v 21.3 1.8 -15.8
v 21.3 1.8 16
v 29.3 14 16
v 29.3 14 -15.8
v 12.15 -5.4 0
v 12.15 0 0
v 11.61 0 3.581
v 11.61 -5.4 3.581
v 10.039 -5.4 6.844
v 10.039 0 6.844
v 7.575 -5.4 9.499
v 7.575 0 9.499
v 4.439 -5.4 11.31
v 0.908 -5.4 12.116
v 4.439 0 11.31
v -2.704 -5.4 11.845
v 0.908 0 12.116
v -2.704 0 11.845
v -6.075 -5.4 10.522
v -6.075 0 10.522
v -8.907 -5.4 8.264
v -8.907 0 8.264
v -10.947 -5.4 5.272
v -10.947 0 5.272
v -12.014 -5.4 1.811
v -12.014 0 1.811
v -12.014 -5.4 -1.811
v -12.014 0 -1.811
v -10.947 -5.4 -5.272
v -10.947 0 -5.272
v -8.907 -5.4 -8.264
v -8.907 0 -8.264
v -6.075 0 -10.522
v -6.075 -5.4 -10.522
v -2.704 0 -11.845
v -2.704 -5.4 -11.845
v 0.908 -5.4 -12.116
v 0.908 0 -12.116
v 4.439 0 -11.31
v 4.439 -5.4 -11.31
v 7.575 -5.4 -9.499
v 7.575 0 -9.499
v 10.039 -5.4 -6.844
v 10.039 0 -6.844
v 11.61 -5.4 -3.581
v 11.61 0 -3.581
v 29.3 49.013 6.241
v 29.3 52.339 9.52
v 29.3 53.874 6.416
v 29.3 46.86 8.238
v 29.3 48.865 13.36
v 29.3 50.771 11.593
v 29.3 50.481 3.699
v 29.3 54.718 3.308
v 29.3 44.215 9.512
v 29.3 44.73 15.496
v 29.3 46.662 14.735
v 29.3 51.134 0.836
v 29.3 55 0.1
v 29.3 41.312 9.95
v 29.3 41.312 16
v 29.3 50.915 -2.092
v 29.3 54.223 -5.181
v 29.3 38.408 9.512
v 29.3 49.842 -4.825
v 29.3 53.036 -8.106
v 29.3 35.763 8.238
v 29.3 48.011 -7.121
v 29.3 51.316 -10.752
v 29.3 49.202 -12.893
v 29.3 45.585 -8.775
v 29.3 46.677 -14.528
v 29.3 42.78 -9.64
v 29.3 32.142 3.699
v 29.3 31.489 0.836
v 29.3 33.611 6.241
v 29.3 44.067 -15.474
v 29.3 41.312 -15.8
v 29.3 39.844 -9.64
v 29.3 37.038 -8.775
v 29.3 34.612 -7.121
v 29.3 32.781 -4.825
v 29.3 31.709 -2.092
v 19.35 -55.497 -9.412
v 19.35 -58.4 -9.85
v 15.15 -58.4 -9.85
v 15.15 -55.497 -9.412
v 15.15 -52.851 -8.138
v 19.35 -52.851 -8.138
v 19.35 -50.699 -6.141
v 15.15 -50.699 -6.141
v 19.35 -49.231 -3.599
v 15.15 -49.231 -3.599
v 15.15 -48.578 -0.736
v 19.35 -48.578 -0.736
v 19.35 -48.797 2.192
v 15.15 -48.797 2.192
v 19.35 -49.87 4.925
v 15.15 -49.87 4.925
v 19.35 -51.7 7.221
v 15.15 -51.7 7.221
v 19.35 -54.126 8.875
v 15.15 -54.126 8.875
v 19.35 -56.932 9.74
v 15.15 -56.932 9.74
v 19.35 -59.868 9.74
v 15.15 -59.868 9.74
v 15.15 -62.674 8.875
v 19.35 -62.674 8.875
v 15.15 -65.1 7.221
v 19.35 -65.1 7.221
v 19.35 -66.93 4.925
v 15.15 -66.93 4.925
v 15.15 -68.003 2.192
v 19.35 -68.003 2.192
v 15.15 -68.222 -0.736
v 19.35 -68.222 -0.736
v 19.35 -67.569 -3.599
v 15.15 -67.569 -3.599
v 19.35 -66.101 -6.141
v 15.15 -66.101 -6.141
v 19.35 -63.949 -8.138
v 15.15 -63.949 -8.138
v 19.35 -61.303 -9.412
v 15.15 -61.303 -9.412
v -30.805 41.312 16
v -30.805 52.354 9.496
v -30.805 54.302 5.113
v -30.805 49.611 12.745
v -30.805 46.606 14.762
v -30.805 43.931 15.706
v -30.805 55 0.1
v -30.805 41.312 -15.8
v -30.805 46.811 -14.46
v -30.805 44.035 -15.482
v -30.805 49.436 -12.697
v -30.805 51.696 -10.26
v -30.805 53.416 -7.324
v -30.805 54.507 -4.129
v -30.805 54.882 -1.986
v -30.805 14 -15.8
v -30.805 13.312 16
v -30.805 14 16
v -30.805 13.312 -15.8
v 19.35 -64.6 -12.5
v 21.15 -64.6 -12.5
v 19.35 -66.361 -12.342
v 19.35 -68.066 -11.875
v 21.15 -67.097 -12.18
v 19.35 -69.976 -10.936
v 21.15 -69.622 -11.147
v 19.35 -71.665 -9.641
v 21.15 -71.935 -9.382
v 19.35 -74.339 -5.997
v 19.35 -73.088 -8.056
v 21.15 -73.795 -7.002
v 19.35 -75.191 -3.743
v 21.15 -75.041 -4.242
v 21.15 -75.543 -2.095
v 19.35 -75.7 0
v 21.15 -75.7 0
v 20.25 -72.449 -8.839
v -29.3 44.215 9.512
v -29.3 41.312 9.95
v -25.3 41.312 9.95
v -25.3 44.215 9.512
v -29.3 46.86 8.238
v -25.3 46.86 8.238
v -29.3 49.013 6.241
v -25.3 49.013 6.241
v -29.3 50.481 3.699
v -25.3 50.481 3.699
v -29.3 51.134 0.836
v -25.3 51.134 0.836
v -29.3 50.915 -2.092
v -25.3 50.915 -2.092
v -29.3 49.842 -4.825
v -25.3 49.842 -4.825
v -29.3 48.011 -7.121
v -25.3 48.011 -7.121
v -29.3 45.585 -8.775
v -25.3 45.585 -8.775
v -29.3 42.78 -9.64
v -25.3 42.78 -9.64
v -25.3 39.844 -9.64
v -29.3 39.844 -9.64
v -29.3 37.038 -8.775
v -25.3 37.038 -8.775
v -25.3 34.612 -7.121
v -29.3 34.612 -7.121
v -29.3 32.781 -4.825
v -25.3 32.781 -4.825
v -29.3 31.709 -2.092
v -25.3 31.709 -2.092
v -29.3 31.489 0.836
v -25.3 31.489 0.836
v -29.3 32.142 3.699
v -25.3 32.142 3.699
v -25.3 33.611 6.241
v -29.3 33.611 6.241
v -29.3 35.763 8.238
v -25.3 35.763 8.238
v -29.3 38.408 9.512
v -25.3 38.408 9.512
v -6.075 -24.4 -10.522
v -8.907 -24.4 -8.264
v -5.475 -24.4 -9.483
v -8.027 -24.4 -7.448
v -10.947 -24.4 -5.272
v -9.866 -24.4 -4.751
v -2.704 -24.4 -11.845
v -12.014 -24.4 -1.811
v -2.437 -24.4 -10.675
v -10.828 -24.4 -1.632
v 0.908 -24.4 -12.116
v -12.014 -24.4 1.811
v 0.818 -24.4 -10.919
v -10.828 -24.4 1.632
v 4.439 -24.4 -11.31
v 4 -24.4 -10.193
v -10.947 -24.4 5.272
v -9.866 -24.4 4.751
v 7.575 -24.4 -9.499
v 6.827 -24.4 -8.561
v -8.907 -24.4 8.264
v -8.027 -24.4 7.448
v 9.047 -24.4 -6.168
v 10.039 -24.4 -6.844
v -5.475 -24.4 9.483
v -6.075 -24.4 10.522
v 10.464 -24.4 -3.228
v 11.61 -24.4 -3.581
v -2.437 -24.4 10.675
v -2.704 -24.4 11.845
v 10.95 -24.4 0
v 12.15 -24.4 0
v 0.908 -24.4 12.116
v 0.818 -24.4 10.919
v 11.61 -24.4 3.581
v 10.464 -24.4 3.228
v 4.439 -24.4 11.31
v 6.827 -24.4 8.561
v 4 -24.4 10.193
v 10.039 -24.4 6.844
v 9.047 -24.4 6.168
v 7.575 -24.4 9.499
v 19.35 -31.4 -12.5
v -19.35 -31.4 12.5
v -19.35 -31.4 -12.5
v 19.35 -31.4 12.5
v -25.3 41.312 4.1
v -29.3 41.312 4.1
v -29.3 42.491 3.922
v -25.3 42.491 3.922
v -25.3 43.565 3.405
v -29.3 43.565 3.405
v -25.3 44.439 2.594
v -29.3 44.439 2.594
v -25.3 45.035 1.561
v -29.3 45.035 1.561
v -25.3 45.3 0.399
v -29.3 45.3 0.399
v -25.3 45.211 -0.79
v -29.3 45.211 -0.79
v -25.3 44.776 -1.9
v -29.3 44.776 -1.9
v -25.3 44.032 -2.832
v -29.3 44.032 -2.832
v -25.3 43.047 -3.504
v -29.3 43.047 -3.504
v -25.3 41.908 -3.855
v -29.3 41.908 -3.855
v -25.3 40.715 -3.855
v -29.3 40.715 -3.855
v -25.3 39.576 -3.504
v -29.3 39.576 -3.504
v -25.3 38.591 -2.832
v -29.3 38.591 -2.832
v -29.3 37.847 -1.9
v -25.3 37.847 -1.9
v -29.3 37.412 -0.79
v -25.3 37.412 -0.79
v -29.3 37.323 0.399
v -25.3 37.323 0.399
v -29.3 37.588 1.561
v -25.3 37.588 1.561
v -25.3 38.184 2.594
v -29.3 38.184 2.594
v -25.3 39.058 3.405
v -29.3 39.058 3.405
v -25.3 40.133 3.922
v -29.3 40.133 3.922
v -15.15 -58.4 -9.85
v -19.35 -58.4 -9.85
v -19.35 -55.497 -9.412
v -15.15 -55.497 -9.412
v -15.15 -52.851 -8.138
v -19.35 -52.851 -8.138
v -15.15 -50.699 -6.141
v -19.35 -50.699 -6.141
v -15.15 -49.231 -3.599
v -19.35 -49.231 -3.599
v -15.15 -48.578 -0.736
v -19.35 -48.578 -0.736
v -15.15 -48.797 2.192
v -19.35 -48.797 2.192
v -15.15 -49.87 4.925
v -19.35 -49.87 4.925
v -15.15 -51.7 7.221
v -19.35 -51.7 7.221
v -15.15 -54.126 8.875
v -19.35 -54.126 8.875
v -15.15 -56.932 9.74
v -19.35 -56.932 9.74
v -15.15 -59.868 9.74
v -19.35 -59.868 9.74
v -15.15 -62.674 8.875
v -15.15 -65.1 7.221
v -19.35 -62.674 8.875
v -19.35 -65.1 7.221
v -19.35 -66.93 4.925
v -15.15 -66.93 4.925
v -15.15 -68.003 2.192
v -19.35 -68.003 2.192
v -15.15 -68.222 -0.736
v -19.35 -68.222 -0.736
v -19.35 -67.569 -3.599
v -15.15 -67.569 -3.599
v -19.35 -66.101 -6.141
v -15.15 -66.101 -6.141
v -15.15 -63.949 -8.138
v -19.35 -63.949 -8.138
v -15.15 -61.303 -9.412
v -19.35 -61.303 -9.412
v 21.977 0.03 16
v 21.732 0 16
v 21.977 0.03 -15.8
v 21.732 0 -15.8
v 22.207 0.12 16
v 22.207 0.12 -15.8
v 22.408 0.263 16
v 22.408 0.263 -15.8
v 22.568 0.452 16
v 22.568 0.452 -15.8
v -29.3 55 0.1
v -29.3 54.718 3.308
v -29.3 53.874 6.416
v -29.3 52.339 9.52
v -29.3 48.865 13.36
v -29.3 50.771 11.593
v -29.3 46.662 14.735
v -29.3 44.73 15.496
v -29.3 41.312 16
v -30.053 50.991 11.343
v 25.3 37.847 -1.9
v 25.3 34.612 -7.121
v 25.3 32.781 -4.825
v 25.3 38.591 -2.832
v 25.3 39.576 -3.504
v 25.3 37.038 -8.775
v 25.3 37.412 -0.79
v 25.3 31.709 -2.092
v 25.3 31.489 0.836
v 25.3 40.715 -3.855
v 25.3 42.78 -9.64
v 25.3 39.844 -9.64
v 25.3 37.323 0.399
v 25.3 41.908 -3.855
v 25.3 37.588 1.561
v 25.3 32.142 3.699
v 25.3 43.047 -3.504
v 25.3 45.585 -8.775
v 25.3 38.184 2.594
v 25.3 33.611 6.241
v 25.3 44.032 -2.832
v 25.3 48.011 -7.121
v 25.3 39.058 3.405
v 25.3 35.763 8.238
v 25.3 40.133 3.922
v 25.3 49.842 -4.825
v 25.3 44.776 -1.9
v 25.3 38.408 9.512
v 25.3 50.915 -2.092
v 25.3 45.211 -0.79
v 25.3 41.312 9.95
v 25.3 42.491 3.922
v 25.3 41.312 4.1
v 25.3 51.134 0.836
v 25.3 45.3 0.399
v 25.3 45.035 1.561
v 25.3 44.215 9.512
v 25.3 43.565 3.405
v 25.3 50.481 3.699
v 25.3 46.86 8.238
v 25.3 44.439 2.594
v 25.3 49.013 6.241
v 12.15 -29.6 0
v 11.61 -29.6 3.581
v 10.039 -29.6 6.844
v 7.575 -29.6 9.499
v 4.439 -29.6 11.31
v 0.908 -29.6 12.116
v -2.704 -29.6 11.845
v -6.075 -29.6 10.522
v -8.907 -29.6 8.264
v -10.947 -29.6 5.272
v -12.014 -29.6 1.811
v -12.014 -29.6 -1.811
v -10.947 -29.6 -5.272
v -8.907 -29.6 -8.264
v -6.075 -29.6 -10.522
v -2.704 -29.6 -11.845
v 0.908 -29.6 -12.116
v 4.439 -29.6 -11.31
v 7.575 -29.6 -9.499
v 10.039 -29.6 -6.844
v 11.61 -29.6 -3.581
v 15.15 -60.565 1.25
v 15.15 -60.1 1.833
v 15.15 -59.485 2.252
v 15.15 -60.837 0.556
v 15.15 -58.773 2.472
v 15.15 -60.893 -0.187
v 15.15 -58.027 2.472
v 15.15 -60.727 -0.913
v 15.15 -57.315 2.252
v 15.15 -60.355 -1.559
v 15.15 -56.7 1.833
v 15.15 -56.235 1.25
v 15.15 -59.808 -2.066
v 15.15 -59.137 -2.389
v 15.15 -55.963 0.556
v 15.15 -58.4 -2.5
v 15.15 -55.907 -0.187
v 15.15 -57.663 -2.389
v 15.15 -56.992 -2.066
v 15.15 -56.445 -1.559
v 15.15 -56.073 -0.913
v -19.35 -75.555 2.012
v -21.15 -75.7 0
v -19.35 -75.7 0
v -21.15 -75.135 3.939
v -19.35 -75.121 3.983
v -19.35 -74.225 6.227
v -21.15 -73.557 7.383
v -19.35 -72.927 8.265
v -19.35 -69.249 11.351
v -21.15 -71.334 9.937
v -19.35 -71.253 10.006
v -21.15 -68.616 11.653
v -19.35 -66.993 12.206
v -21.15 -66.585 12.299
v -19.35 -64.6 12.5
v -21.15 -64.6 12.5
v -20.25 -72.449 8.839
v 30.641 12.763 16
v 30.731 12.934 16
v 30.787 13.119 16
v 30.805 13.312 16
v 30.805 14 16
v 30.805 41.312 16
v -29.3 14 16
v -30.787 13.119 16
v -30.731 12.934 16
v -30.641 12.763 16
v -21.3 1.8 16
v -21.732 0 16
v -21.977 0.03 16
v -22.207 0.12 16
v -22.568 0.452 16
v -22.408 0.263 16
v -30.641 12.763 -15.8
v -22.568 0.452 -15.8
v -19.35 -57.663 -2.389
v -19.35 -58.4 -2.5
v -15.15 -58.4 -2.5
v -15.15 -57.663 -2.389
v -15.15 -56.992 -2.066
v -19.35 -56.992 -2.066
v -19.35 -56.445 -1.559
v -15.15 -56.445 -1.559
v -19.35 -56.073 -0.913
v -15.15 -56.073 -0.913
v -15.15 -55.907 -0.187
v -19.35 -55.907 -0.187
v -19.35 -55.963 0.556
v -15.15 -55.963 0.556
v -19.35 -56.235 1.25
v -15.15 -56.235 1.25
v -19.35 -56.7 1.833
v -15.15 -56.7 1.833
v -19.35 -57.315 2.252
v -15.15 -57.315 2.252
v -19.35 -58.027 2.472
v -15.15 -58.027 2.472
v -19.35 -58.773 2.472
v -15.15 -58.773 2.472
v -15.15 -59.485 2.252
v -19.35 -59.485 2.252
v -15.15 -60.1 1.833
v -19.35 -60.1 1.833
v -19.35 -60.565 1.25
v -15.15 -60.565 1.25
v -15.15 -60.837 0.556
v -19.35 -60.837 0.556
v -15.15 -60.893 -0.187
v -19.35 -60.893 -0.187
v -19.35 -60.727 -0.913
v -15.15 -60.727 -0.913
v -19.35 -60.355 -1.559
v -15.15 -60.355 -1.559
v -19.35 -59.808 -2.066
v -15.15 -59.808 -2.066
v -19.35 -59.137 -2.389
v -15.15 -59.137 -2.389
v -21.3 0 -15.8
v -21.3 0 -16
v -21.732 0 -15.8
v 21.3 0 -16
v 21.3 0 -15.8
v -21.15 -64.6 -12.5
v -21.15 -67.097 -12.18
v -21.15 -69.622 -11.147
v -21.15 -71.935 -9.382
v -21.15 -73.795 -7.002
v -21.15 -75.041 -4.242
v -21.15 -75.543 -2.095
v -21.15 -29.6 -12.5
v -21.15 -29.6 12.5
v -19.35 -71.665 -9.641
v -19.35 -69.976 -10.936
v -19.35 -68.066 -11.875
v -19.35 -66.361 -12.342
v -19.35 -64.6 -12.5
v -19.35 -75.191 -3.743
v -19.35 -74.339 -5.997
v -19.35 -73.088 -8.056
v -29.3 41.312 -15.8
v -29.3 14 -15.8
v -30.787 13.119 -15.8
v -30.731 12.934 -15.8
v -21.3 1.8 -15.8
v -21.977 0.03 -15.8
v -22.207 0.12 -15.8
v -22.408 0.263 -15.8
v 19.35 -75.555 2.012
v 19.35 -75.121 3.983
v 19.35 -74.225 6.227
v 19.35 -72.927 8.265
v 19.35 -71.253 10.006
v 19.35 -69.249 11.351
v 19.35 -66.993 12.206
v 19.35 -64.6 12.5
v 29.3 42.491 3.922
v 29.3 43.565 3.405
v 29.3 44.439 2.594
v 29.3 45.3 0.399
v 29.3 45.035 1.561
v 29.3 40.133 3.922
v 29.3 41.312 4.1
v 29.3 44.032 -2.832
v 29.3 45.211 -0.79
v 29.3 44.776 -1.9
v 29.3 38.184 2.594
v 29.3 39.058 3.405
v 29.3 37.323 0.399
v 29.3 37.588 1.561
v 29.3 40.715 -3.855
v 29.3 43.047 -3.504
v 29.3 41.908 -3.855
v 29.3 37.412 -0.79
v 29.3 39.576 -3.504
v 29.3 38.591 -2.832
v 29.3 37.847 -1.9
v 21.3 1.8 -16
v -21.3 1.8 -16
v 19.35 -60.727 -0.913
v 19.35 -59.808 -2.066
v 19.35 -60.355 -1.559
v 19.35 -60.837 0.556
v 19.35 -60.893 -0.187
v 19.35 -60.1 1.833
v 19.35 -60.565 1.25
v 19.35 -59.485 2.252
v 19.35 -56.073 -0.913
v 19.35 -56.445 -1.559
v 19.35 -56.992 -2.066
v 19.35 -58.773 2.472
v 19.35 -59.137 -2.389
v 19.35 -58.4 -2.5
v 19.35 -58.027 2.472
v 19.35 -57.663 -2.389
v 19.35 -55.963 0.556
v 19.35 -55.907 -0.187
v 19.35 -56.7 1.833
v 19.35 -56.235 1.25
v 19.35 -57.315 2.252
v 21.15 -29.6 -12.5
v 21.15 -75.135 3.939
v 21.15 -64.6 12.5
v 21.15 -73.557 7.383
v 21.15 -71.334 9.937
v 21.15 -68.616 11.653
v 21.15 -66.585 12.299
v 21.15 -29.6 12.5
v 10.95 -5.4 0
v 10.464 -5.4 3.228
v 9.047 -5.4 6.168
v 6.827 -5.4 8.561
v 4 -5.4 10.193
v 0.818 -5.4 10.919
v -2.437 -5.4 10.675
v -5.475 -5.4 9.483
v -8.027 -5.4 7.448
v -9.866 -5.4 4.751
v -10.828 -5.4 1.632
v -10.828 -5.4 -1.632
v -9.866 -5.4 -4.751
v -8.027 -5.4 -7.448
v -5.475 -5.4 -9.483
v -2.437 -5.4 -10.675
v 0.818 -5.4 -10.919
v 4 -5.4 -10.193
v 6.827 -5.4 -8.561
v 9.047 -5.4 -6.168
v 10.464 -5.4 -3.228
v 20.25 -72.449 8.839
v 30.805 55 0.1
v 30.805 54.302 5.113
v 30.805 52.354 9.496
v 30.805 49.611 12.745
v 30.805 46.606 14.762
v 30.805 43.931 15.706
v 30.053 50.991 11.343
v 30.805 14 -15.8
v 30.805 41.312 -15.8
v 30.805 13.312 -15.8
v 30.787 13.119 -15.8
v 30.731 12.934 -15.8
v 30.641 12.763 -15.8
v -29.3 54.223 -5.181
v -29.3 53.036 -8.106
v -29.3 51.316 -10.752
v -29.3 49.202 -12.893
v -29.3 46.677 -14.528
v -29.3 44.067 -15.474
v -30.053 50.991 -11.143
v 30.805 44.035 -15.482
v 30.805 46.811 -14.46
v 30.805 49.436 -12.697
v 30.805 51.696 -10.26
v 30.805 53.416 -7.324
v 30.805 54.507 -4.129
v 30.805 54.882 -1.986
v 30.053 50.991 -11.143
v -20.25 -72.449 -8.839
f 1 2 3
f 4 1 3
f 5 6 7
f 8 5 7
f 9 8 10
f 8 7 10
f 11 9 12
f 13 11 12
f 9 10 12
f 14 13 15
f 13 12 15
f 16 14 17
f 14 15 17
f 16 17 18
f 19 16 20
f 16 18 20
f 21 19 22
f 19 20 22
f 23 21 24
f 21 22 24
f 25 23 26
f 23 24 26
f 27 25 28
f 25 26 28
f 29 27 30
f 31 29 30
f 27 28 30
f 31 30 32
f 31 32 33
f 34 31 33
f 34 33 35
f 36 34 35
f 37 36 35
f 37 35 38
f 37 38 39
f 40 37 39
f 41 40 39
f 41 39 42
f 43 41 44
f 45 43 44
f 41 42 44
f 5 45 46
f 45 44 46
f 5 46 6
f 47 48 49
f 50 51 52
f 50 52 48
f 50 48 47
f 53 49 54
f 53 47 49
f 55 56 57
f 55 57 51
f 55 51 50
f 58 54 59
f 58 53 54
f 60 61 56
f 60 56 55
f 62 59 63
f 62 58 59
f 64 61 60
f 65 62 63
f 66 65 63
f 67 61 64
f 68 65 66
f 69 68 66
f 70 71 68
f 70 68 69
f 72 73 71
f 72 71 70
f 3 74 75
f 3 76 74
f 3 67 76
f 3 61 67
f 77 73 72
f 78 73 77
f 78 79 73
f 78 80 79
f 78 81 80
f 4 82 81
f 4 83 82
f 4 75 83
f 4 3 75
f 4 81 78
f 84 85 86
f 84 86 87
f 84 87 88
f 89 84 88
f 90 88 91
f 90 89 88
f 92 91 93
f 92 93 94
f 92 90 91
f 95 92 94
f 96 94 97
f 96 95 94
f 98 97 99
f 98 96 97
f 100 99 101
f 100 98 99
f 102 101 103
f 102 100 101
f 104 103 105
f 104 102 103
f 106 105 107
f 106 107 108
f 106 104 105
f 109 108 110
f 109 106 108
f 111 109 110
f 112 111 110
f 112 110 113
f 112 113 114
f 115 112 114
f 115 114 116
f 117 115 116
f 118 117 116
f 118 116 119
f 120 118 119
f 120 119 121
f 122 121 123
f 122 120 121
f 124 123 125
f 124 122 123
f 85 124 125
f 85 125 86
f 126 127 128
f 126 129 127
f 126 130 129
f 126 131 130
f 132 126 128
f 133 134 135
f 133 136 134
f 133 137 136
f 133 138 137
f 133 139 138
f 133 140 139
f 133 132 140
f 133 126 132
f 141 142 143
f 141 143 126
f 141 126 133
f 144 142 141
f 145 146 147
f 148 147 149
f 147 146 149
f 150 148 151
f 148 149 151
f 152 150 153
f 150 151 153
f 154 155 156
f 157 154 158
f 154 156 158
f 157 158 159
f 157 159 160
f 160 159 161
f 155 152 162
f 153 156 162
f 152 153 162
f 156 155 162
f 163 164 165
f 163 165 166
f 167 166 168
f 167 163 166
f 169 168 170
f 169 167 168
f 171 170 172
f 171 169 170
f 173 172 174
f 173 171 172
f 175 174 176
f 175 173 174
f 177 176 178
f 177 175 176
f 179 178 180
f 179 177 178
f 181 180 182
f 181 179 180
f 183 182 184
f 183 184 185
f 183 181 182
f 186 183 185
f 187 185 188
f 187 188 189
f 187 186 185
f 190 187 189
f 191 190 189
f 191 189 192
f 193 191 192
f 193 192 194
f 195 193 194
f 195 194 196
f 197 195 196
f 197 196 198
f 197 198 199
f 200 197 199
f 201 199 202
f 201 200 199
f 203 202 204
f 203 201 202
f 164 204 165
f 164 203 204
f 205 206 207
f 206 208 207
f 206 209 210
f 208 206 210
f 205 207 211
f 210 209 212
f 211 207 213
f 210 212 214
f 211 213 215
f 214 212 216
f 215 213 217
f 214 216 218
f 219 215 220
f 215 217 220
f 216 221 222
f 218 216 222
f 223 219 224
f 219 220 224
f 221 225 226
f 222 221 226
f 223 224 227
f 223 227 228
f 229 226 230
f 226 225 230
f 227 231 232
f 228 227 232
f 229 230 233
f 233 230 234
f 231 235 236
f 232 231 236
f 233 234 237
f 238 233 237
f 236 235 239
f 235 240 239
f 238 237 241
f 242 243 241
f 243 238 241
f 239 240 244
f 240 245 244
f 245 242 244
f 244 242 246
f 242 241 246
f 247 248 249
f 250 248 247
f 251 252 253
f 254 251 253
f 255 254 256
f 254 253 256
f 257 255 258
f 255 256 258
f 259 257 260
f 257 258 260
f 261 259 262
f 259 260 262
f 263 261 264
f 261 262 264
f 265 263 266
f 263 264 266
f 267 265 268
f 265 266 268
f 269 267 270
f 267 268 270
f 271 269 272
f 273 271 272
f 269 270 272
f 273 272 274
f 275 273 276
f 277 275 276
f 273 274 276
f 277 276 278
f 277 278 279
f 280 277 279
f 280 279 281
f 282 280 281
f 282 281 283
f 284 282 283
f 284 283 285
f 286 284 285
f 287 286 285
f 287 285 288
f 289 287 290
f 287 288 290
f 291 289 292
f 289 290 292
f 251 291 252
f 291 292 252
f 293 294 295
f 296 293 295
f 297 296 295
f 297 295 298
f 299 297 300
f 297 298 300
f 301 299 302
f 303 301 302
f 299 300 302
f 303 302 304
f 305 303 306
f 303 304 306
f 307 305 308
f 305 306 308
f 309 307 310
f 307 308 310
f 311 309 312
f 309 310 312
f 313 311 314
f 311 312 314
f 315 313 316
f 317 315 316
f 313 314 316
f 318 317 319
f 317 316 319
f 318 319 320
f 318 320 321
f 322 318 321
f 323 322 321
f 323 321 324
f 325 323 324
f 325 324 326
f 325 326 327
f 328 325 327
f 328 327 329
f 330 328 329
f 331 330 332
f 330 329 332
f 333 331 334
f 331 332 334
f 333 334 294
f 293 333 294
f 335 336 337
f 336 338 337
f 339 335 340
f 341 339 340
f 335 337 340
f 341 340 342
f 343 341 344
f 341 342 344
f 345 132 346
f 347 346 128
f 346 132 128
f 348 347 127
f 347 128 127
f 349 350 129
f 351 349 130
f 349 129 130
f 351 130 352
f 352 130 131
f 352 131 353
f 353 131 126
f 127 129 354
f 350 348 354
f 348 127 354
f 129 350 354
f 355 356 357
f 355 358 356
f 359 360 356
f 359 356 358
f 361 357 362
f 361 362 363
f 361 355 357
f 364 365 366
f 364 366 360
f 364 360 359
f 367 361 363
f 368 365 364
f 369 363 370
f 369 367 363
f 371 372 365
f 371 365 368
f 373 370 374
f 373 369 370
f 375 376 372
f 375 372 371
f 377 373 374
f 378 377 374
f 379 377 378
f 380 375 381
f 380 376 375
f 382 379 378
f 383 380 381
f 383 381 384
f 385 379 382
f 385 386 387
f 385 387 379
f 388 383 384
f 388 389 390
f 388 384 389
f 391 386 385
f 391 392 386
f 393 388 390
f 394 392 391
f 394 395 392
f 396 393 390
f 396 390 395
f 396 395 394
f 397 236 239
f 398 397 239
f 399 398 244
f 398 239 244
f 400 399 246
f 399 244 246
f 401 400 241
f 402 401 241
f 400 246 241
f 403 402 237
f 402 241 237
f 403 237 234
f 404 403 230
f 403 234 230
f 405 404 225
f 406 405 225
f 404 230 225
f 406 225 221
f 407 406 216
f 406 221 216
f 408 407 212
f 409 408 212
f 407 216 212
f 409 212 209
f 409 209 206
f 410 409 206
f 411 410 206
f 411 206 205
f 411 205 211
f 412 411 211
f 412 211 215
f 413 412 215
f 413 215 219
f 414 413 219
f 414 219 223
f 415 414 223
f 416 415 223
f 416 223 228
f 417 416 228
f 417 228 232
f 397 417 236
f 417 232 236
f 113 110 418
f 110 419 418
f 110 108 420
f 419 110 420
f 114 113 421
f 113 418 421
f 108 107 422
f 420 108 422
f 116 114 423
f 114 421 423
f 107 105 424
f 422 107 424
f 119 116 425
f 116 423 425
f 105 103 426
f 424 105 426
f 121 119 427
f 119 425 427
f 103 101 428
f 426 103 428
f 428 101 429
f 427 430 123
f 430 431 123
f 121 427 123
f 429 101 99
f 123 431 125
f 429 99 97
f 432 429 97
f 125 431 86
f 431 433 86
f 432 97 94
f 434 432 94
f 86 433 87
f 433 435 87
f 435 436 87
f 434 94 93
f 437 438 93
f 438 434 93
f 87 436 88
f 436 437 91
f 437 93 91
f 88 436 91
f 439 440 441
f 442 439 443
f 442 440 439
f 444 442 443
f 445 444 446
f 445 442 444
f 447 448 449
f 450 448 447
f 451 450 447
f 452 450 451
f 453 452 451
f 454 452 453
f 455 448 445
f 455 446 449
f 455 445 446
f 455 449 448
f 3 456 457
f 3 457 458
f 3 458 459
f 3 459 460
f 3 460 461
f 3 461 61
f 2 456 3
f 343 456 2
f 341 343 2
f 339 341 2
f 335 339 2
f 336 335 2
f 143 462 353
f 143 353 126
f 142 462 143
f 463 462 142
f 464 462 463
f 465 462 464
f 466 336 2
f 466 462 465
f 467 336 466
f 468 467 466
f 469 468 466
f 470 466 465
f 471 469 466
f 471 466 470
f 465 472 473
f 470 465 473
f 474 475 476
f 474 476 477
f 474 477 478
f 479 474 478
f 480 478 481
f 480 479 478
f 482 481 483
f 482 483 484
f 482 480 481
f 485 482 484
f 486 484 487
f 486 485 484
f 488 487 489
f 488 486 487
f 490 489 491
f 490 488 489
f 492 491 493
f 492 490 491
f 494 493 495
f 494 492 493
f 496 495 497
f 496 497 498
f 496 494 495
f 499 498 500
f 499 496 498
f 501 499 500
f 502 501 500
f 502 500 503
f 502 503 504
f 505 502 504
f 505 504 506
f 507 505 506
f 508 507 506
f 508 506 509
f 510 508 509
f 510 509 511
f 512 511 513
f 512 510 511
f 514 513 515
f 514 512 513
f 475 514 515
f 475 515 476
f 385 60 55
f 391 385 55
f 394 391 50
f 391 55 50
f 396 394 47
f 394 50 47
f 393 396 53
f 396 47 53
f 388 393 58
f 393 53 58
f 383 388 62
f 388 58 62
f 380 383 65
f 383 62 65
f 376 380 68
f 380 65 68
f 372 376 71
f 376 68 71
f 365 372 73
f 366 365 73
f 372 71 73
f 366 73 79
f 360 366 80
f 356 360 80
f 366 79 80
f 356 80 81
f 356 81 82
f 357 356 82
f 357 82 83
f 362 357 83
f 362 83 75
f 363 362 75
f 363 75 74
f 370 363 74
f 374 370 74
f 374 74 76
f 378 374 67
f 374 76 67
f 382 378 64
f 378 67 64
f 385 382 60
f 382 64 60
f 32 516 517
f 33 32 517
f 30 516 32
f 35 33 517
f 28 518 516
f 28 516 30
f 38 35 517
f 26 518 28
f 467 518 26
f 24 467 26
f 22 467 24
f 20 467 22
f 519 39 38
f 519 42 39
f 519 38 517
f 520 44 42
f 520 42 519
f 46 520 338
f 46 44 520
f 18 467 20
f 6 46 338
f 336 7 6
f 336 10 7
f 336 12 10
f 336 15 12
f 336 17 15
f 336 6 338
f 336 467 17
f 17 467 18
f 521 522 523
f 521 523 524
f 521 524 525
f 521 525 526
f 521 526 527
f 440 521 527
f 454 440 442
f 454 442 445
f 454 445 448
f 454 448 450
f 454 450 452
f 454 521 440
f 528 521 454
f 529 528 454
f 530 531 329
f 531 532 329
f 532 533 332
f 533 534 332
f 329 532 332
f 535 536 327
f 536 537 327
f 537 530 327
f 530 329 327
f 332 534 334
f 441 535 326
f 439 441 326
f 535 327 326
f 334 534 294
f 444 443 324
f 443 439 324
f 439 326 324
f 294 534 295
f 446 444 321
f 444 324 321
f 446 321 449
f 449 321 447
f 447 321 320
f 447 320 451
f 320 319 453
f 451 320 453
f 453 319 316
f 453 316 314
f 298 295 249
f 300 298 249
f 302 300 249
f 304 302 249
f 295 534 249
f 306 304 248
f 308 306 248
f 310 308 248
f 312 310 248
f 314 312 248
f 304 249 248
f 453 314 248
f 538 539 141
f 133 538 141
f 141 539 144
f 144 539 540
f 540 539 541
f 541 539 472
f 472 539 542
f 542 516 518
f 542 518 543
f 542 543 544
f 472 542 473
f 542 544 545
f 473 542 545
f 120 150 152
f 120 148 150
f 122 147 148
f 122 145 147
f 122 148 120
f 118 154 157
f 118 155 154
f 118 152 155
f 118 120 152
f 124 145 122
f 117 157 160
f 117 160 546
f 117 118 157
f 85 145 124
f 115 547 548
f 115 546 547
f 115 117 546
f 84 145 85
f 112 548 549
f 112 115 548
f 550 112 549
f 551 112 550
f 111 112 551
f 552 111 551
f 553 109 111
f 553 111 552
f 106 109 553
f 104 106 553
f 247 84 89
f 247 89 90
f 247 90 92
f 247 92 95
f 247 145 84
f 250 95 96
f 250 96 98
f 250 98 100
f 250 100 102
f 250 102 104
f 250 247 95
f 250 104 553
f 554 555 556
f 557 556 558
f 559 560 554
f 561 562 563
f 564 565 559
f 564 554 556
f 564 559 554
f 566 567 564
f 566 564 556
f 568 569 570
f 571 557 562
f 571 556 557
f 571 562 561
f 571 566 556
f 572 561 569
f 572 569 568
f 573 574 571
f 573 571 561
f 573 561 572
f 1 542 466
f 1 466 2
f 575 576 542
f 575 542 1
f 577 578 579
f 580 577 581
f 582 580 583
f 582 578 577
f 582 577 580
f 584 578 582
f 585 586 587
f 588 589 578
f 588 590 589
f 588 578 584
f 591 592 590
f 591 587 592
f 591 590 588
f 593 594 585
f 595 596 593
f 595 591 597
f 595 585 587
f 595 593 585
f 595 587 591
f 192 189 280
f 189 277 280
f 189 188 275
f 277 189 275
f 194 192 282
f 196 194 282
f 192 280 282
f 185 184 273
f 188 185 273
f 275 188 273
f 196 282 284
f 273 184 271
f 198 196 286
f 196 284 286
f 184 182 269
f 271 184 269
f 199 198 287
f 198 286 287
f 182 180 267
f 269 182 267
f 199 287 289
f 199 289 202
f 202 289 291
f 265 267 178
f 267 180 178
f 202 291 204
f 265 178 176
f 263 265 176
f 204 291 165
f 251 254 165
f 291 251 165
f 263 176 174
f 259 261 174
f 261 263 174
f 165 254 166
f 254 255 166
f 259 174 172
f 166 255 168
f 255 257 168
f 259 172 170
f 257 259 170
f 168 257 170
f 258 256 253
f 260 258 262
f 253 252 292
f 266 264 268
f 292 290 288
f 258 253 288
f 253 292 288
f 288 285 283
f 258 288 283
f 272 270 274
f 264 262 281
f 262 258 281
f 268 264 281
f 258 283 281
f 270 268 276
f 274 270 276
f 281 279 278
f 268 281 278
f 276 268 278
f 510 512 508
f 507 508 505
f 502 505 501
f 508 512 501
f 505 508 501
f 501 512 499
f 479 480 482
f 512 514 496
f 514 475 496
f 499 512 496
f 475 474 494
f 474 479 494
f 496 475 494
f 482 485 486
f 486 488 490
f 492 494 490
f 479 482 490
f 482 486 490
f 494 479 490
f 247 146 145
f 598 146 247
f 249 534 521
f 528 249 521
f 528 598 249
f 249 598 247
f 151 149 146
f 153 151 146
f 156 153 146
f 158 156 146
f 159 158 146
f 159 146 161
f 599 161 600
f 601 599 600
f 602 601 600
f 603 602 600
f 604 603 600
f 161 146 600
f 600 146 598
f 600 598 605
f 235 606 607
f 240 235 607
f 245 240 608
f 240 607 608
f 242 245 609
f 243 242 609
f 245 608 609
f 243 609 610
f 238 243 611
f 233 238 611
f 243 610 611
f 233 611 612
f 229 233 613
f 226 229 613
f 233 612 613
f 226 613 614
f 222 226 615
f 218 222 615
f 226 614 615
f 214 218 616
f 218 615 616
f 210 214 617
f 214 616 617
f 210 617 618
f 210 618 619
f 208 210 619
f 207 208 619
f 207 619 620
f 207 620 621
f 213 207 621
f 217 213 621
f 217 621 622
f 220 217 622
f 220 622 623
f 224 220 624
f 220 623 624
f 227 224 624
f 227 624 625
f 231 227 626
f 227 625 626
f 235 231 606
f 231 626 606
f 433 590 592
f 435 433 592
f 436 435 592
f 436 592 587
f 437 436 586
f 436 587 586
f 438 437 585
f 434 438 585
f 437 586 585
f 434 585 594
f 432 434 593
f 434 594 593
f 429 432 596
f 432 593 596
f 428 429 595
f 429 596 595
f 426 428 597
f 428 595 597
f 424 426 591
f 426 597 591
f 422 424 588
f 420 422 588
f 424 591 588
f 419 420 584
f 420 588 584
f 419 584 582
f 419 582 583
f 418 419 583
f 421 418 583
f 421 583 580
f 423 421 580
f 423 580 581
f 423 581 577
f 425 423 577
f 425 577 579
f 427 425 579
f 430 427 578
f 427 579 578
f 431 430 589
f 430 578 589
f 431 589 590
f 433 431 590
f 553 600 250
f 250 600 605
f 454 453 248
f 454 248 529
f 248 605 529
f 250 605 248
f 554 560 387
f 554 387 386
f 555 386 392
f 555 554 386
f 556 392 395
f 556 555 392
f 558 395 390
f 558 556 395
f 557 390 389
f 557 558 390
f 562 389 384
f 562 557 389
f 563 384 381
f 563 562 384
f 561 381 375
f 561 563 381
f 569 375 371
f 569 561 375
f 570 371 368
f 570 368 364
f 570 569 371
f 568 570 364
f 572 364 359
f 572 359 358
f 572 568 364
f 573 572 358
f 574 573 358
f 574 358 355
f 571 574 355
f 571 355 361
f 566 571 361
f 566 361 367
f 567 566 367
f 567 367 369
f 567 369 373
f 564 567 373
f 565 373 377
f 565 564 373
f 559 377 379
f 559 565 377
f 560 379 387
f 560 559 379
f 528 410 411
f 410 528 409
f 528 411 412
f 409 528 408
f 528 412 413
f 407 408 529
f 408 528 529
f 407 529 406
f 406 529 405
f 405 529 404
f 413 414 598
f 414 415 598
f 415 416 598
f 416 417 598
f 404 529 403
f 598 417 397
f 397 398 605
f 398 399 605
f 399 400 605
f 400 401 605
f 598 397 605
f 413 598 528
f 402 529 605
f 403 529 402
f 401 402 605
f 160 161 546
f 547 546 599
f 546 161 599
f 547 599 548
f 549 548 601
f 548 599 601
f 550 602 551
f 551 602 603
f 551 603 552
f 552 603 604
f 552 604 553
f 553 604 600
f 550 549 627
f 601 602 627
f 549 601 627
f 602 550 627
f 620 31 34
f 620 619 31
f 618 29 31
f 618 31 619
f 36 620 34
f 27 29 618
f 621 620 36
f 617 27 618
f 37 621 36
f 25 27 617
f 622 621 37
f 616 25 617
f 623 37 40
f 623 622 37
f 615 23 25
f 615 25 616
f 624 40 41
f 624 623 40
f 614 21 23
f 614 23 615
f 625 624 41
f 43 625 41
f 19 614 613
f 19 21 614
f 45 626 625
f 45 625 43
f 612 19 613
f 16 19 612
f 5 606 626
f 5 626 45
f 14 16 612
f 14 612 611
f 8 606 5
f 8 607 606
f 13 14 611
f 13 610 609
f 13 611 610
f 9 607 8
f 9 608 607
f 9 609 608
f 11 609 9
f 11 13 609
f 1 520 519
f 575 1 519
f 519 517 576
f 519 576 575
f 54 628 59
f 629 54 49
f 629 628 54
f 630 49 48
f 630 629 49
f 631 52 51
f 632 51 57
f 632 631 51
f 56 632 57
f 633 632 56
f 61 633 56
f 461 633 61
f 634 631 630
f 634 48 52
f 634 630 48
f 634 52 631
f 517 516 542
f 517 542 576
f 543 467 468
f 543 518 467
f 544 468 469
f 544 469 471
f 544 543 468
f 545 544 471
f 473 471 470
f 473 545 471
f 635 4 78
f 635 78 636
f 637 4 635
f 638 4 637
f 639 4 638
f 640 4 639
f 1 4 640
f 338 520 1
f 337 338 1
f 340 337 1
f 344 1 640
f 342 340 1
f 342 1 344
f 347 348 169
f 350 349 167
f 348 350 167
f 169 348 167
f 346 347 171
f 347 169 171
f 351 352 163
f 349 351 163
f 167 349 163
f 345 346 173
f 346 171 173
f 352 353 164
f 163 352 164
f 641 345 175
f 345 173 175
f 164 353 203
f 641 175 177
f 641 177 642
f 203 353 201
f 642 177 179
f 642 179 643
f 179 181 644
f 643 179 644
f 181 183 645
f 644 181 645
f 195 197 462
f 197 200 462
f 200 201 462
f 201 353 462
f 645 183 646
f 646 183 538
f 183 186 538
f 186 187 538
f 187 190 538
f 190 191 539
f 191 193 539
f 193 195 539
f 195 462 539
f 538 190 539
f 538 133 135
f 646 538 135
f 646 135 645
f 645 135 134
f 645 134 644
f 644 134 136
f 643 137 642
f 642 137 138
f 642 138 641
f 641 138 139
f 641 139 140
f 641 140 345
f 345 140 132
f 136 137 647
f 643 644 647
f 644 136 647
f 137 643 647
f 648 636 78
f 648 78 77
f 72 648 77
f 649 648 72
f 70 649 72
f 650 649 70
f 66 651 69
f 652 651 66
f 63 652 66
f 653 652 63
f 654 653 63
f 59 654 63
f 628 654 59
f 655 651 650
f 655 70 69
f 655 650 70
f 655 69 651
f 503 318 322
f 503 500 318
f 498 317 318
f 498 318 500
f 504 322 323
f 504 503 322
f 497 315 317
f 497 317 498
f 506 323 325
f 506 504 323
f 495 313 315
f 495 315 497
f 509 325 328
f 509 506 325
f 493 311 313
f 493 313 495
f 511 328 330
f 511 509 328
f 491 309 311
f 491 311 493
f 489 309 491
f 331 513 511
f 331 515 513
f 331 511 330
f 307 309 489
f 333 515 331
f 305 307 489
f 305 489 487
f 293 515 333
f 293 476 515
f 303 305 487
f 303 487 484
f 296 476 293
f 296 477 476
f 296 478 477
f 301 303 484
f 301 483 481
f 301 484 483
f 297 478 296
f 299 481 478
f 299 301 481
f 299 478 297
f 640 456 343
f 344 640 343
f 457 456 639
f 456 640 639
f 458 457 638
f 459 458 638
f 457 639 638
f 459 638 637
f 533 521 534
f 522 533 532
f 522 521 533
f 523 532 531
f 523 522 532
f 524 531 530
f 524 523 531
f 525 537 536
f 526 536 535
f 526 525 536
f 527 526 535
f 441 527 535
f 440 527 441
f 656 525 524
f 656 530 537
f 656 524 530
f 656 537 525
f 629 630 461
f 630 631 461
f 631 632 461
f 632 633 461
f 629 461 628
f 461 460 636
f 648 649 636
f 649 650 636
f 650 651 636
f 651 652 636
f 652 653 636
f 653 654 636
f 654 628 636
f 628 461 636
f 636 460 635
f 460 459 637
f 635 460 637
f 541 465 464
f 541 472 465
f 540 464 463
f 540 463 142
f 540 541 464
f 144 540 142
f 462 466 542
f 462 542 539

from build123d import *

# Parameters (mm, degrees)
SKETCH2_W            = 42.6
SKETCH2_H            = 32
BOSS_EXTRUDE1_DEPTH  = 1.8
BOSS_EXTRUDE2_DEPTH  = 31.8
FILLET1_R            = 1
SKETCH4_W            = 1.505239861
SKETCH4_H            = 31.8
BOSS_EXTRUDE3_DEPTH  = 41
CUT_EXTRUDE1_DEPTH   = 41
SKETCH7_R            = 9.85
SKETCH7_R_2          = 4
BOSS_EXTRUDE4_DEPTH  = 4
FILLET1_OF_MIRROR2_R = 1
SKETCH8_R            = 12.15
BOSS_EXTRUDE5_DEPTH  = 5.4
SKETCH9_R            = 10.95
BOSS_EXTRUDE6_DEPTH  = 19
SKETCH11_R           = 12.15
BOSS_EXTRUDE7_DEPTH  = 5.2
SKETCH12_W           = 42.3
SKETCH12_H           = 25
BOSS_EXTRUDE8_DEPTH  = 1.8
SKETCH13_W           = 1.8
SKETCH13_H           = 25
BOSS_EXTRUDE9_DEPTH  = 44.3
CUT_EXTRUDE5_DEPTH   = 44.3
SKETCH18_R           = 9.85
SKETCH18_R_2         = 2.5
BOSS_EXTRUDE10_DEPTH = 4.2


with BuildPart() as part:
    # Sketch2 → Boss-Extrude1 (new body)
    with BuildSketch(Plane(origin=(0, 0, 0), x_dir=(1, 0, 0), z_dir=(0, 1, 0))):
        Rectangle(SKETCH2_W, SKETCH2_H)
    extrude(amount=BOSS_EXTRUDE1_DEPTH)

    # Sketch3 → Boss-Extrude2 (add)
    with BuildSketch(Plane.XY.offset(16)):
        Polygon((21.3, 1.8), (29.3, 14), (30.805239861, 14), (30.805239861, 13.012957468), (22.272152997, 0), (21.3, 0), align=None)
    boss_extrude2 = extrude(amount=-BOSS_EXTRUDE2_DEPTH)

    # Fillet1
    fillet1_edges = [part.edges().sort_by_distance(p)[0] for p in [
        (30.805239861, 13.012957468, 0.1),
        (22.272152997, 0, 0.1),
    ]]
    fillet(fillet1_edges, radius=FILLET1_R)

    # Sketch4 → Boss-Extrude3 (add)
    with BuildSketch(Plane(origin=(0, 14, 0), x_dir=(1, 0, 0), z_dir=(0, 1, 0))):
        with Locations((30.052619931, -0.1)):
            Rectangle(SKETCH4_W, SKETCH4_H)
    boss_extrude3 = extrude(amount=BOSS_EXTRUDE3_DEPTH)

    # Sketch5 → Cut-Extrude1 (cut)
    with BuildSketch(Plane(origin=(30.805239861, 0, 0), x_dir=(0, 0, -1), z_dir=(1, 0, 0))):
        with BuildLine():
            Line((-16, 55), (-16, 41.31158709))
            add(Edge.make_bspline(
                [(-0.1, 55), (-16, 55), (-16, 41.31158709)],
                knots=[1.570796327, 1.570796327, 1.570796327, 3.141592654, 3.141592654, 3.141592654], degree=2, weights=[1, 0.707106781, 1]))
            Line((-0.1, 55), (-16, 55))
        make_face()
        with BuildLine():
            Line((15.8, 55), (-0.1, 55))
            add(Edge.make_bspline(
                [(15.8, 41.31158709), (15.8, 55), (-0.1, 55)],
                knots=[0, 0, 0, 1.570796327, 1.570796327, 1.570796327], degree=2, weights=[1, 0.707106781, 1]))
            Line((15.8, 41.31158709), (15.8, 55))
        make_face()
    cut_extrude1 = extrude(amount=-CUT_EXTRUDE1_DEPTH, mode=Mode.SUBTRACT)

    # Sketch7 → Boss-Extrude4 (add)
    with BuildSketch(Plane.ZY.offset(-29.3)):
        with Locations((0.1, 41.31158709)):
            Circle(SKETCH7_R)
        with Locations((0.1, 41.31158709)):
            Circle(SKETCH7_R_2, mode=Mode.SUBTRACT)
    boss_extrude4 = extrude(amount=BOSS_EXTRUDE4_DEPTH)

    # Mirror2: Boss-Extrude2, Boss-Extrude3, Cut-Extrude1, Boss-Extrude4 across plane
    add(boss_extrude2.mirror(Plane(origin=(0, 0, 0), x_dir=(0, 0, 1), z_dir=(1, 0, 0))))
    add(boss_extrude3.mirror(Plane(origin=(0, 0, 0), x_dir=(0, 0, 1), z_dir=(1, 0, 0))))
    add(cut_extrude1.mirror(Plane(origin=(0, 0, 0), x_dir=(0, 0, 1), z_dir=(1, 0, 0))), mode=Mode.SUBTRACT)
    add(boss_extrude4.mirror(Plane(origin=(0, 0, 0), x_dir=(0, 0, 1), z_dir=(1, 0, 0))))

    # Fillet1 of Mirror2
    fillet1_of_mirror2_edges = [part.edges().sort_by_distance(p)[0] for p in [
        (-30.805239861, 13.012957468, 0.1),
        (-22.272152997, 0, 0.1),
    ]]
    fillet(fillet1_of_mirror2_edges, radius=FILLET1_OF_MIRROR2_R)

    # Sketch8 → Boss-Extrude5 (add)
    with BuildSketch(Plane.XZ):
        Circle(SKETCH8_R)
    extrude(amount=BOSS_EXTRUDE5_DEPTH)

    # Sketch9 → Boss-Extrude6 (add)
    with BuildSketch(Plane.XZ.offset(5.4)):
        Circle(SKETCH9_R)
    extrude(amount=BOSS_EXTRUDE6_DEPTH)

    # Sketch11 → Boss-Extrude7 (add)
    with BuildSketch(Plane.XZ.offset(24.4)):
        Circle(SKETCH11_R)
    extrude(amount=BOSS_EXTRUDE7_DEPTH)

    # Sketch12 → Boss-Extrude8 (add)
    with BuildSketch(Plane.XZ.offset(29.6)):
        Rectangle(SKETCH12_W, SKETCH12_H)
    extrude(amount=BOSS_EXTRUDE8_DEPTH)

    # Sketch13 → Boss-Extrude9 (add)
    with BuildSketch(Plane.XZ.offset(31.4)):
        with Locations((-20.25, 0)):
            Rectangle(SKETCH13_W, SKETCH13_H)
    boss_extrude9 = extrude(amount=BOSS_EXTRUDE9_DEPTH)

    # Sketch16 → Cut-Extrude5 (cut)
    with BuildSketch(Plane.ZY.offset(21.15)):
        with BuildLine():
            add(Edge.make_bspline(
                [(-12.5, -64.6), (-12.5, -75.7), (0, -75.7)],
                knots=[3.141592654, 3.141592654, 3.141592654, 4.71238898, 4.71238898, 4.71238898], degree=2, weights=[1, 0.707106781, 1]))
            Line((-12.5, -64.6), (-12.5, -75.7))
            Line((-12.5, -75.7), (3.5e-08, -75.7))
        make_face()
        with BuildLine():
            Line((12.5, -75.7), (12.5, -64.6))
            add(Edge.make_bspline(
                [(3.5e-08, -75.7), (12.5, -75.699999969), (12.5, -64.6)],
                knots=[4.712388984, 4.712388984, 4.712388984, 6.283185307, 6.283185307, 6.283185307], degree=2, weights=[0.999999999, 0.707106782, 1]))
            Line((3.5e-08, -75.7), (12.5, -75.7))
        make_face()
    cut_extrude5 = extrude(amount=-CUT_EXTRUDE5_DEPTH, mode=Mode.SUBTRACT)

    # Sketch18 → Boss-Extrude10 (add)
    with BuildSketch(Plane(origin=(-19.35, 0, 0), x_dir=(0, 0, -1), z_dir=(1, 0, 0))):
        with Locations((0, -58.4)):
            Circle(SKETCH18_R)
        with Locations((0, -58.4)):
            Circle(SKETCH18_R_2, mode=Mode.SUBTRACT)
    boss_extrude10 = extrude(amount=BOSS_EXTRUDE10_DEPTH)

    # Mirror3: Boss-Extrude9, Cut-Extrude5, Boss-Extrude10 across plane
    add(boss_extrude9.mirror(Plane(origin=(0, 0, 0), x_dir=(0, 0, 1), z_dir=(1, 0, 0))))
    add(cut_extrude5.mirror(Plane(origin=(0, 0, 0), x_dir=(0, 0, 1), z_dir=(1, 0, 0))), mode=Mode.SUBTRACT)
    add(boss_extrude10.mirror(Plane(origin=(0, 0, 0), x_dir=(0, 0, 1), z_dir=(1, 0, 0))))


solid = part.part
